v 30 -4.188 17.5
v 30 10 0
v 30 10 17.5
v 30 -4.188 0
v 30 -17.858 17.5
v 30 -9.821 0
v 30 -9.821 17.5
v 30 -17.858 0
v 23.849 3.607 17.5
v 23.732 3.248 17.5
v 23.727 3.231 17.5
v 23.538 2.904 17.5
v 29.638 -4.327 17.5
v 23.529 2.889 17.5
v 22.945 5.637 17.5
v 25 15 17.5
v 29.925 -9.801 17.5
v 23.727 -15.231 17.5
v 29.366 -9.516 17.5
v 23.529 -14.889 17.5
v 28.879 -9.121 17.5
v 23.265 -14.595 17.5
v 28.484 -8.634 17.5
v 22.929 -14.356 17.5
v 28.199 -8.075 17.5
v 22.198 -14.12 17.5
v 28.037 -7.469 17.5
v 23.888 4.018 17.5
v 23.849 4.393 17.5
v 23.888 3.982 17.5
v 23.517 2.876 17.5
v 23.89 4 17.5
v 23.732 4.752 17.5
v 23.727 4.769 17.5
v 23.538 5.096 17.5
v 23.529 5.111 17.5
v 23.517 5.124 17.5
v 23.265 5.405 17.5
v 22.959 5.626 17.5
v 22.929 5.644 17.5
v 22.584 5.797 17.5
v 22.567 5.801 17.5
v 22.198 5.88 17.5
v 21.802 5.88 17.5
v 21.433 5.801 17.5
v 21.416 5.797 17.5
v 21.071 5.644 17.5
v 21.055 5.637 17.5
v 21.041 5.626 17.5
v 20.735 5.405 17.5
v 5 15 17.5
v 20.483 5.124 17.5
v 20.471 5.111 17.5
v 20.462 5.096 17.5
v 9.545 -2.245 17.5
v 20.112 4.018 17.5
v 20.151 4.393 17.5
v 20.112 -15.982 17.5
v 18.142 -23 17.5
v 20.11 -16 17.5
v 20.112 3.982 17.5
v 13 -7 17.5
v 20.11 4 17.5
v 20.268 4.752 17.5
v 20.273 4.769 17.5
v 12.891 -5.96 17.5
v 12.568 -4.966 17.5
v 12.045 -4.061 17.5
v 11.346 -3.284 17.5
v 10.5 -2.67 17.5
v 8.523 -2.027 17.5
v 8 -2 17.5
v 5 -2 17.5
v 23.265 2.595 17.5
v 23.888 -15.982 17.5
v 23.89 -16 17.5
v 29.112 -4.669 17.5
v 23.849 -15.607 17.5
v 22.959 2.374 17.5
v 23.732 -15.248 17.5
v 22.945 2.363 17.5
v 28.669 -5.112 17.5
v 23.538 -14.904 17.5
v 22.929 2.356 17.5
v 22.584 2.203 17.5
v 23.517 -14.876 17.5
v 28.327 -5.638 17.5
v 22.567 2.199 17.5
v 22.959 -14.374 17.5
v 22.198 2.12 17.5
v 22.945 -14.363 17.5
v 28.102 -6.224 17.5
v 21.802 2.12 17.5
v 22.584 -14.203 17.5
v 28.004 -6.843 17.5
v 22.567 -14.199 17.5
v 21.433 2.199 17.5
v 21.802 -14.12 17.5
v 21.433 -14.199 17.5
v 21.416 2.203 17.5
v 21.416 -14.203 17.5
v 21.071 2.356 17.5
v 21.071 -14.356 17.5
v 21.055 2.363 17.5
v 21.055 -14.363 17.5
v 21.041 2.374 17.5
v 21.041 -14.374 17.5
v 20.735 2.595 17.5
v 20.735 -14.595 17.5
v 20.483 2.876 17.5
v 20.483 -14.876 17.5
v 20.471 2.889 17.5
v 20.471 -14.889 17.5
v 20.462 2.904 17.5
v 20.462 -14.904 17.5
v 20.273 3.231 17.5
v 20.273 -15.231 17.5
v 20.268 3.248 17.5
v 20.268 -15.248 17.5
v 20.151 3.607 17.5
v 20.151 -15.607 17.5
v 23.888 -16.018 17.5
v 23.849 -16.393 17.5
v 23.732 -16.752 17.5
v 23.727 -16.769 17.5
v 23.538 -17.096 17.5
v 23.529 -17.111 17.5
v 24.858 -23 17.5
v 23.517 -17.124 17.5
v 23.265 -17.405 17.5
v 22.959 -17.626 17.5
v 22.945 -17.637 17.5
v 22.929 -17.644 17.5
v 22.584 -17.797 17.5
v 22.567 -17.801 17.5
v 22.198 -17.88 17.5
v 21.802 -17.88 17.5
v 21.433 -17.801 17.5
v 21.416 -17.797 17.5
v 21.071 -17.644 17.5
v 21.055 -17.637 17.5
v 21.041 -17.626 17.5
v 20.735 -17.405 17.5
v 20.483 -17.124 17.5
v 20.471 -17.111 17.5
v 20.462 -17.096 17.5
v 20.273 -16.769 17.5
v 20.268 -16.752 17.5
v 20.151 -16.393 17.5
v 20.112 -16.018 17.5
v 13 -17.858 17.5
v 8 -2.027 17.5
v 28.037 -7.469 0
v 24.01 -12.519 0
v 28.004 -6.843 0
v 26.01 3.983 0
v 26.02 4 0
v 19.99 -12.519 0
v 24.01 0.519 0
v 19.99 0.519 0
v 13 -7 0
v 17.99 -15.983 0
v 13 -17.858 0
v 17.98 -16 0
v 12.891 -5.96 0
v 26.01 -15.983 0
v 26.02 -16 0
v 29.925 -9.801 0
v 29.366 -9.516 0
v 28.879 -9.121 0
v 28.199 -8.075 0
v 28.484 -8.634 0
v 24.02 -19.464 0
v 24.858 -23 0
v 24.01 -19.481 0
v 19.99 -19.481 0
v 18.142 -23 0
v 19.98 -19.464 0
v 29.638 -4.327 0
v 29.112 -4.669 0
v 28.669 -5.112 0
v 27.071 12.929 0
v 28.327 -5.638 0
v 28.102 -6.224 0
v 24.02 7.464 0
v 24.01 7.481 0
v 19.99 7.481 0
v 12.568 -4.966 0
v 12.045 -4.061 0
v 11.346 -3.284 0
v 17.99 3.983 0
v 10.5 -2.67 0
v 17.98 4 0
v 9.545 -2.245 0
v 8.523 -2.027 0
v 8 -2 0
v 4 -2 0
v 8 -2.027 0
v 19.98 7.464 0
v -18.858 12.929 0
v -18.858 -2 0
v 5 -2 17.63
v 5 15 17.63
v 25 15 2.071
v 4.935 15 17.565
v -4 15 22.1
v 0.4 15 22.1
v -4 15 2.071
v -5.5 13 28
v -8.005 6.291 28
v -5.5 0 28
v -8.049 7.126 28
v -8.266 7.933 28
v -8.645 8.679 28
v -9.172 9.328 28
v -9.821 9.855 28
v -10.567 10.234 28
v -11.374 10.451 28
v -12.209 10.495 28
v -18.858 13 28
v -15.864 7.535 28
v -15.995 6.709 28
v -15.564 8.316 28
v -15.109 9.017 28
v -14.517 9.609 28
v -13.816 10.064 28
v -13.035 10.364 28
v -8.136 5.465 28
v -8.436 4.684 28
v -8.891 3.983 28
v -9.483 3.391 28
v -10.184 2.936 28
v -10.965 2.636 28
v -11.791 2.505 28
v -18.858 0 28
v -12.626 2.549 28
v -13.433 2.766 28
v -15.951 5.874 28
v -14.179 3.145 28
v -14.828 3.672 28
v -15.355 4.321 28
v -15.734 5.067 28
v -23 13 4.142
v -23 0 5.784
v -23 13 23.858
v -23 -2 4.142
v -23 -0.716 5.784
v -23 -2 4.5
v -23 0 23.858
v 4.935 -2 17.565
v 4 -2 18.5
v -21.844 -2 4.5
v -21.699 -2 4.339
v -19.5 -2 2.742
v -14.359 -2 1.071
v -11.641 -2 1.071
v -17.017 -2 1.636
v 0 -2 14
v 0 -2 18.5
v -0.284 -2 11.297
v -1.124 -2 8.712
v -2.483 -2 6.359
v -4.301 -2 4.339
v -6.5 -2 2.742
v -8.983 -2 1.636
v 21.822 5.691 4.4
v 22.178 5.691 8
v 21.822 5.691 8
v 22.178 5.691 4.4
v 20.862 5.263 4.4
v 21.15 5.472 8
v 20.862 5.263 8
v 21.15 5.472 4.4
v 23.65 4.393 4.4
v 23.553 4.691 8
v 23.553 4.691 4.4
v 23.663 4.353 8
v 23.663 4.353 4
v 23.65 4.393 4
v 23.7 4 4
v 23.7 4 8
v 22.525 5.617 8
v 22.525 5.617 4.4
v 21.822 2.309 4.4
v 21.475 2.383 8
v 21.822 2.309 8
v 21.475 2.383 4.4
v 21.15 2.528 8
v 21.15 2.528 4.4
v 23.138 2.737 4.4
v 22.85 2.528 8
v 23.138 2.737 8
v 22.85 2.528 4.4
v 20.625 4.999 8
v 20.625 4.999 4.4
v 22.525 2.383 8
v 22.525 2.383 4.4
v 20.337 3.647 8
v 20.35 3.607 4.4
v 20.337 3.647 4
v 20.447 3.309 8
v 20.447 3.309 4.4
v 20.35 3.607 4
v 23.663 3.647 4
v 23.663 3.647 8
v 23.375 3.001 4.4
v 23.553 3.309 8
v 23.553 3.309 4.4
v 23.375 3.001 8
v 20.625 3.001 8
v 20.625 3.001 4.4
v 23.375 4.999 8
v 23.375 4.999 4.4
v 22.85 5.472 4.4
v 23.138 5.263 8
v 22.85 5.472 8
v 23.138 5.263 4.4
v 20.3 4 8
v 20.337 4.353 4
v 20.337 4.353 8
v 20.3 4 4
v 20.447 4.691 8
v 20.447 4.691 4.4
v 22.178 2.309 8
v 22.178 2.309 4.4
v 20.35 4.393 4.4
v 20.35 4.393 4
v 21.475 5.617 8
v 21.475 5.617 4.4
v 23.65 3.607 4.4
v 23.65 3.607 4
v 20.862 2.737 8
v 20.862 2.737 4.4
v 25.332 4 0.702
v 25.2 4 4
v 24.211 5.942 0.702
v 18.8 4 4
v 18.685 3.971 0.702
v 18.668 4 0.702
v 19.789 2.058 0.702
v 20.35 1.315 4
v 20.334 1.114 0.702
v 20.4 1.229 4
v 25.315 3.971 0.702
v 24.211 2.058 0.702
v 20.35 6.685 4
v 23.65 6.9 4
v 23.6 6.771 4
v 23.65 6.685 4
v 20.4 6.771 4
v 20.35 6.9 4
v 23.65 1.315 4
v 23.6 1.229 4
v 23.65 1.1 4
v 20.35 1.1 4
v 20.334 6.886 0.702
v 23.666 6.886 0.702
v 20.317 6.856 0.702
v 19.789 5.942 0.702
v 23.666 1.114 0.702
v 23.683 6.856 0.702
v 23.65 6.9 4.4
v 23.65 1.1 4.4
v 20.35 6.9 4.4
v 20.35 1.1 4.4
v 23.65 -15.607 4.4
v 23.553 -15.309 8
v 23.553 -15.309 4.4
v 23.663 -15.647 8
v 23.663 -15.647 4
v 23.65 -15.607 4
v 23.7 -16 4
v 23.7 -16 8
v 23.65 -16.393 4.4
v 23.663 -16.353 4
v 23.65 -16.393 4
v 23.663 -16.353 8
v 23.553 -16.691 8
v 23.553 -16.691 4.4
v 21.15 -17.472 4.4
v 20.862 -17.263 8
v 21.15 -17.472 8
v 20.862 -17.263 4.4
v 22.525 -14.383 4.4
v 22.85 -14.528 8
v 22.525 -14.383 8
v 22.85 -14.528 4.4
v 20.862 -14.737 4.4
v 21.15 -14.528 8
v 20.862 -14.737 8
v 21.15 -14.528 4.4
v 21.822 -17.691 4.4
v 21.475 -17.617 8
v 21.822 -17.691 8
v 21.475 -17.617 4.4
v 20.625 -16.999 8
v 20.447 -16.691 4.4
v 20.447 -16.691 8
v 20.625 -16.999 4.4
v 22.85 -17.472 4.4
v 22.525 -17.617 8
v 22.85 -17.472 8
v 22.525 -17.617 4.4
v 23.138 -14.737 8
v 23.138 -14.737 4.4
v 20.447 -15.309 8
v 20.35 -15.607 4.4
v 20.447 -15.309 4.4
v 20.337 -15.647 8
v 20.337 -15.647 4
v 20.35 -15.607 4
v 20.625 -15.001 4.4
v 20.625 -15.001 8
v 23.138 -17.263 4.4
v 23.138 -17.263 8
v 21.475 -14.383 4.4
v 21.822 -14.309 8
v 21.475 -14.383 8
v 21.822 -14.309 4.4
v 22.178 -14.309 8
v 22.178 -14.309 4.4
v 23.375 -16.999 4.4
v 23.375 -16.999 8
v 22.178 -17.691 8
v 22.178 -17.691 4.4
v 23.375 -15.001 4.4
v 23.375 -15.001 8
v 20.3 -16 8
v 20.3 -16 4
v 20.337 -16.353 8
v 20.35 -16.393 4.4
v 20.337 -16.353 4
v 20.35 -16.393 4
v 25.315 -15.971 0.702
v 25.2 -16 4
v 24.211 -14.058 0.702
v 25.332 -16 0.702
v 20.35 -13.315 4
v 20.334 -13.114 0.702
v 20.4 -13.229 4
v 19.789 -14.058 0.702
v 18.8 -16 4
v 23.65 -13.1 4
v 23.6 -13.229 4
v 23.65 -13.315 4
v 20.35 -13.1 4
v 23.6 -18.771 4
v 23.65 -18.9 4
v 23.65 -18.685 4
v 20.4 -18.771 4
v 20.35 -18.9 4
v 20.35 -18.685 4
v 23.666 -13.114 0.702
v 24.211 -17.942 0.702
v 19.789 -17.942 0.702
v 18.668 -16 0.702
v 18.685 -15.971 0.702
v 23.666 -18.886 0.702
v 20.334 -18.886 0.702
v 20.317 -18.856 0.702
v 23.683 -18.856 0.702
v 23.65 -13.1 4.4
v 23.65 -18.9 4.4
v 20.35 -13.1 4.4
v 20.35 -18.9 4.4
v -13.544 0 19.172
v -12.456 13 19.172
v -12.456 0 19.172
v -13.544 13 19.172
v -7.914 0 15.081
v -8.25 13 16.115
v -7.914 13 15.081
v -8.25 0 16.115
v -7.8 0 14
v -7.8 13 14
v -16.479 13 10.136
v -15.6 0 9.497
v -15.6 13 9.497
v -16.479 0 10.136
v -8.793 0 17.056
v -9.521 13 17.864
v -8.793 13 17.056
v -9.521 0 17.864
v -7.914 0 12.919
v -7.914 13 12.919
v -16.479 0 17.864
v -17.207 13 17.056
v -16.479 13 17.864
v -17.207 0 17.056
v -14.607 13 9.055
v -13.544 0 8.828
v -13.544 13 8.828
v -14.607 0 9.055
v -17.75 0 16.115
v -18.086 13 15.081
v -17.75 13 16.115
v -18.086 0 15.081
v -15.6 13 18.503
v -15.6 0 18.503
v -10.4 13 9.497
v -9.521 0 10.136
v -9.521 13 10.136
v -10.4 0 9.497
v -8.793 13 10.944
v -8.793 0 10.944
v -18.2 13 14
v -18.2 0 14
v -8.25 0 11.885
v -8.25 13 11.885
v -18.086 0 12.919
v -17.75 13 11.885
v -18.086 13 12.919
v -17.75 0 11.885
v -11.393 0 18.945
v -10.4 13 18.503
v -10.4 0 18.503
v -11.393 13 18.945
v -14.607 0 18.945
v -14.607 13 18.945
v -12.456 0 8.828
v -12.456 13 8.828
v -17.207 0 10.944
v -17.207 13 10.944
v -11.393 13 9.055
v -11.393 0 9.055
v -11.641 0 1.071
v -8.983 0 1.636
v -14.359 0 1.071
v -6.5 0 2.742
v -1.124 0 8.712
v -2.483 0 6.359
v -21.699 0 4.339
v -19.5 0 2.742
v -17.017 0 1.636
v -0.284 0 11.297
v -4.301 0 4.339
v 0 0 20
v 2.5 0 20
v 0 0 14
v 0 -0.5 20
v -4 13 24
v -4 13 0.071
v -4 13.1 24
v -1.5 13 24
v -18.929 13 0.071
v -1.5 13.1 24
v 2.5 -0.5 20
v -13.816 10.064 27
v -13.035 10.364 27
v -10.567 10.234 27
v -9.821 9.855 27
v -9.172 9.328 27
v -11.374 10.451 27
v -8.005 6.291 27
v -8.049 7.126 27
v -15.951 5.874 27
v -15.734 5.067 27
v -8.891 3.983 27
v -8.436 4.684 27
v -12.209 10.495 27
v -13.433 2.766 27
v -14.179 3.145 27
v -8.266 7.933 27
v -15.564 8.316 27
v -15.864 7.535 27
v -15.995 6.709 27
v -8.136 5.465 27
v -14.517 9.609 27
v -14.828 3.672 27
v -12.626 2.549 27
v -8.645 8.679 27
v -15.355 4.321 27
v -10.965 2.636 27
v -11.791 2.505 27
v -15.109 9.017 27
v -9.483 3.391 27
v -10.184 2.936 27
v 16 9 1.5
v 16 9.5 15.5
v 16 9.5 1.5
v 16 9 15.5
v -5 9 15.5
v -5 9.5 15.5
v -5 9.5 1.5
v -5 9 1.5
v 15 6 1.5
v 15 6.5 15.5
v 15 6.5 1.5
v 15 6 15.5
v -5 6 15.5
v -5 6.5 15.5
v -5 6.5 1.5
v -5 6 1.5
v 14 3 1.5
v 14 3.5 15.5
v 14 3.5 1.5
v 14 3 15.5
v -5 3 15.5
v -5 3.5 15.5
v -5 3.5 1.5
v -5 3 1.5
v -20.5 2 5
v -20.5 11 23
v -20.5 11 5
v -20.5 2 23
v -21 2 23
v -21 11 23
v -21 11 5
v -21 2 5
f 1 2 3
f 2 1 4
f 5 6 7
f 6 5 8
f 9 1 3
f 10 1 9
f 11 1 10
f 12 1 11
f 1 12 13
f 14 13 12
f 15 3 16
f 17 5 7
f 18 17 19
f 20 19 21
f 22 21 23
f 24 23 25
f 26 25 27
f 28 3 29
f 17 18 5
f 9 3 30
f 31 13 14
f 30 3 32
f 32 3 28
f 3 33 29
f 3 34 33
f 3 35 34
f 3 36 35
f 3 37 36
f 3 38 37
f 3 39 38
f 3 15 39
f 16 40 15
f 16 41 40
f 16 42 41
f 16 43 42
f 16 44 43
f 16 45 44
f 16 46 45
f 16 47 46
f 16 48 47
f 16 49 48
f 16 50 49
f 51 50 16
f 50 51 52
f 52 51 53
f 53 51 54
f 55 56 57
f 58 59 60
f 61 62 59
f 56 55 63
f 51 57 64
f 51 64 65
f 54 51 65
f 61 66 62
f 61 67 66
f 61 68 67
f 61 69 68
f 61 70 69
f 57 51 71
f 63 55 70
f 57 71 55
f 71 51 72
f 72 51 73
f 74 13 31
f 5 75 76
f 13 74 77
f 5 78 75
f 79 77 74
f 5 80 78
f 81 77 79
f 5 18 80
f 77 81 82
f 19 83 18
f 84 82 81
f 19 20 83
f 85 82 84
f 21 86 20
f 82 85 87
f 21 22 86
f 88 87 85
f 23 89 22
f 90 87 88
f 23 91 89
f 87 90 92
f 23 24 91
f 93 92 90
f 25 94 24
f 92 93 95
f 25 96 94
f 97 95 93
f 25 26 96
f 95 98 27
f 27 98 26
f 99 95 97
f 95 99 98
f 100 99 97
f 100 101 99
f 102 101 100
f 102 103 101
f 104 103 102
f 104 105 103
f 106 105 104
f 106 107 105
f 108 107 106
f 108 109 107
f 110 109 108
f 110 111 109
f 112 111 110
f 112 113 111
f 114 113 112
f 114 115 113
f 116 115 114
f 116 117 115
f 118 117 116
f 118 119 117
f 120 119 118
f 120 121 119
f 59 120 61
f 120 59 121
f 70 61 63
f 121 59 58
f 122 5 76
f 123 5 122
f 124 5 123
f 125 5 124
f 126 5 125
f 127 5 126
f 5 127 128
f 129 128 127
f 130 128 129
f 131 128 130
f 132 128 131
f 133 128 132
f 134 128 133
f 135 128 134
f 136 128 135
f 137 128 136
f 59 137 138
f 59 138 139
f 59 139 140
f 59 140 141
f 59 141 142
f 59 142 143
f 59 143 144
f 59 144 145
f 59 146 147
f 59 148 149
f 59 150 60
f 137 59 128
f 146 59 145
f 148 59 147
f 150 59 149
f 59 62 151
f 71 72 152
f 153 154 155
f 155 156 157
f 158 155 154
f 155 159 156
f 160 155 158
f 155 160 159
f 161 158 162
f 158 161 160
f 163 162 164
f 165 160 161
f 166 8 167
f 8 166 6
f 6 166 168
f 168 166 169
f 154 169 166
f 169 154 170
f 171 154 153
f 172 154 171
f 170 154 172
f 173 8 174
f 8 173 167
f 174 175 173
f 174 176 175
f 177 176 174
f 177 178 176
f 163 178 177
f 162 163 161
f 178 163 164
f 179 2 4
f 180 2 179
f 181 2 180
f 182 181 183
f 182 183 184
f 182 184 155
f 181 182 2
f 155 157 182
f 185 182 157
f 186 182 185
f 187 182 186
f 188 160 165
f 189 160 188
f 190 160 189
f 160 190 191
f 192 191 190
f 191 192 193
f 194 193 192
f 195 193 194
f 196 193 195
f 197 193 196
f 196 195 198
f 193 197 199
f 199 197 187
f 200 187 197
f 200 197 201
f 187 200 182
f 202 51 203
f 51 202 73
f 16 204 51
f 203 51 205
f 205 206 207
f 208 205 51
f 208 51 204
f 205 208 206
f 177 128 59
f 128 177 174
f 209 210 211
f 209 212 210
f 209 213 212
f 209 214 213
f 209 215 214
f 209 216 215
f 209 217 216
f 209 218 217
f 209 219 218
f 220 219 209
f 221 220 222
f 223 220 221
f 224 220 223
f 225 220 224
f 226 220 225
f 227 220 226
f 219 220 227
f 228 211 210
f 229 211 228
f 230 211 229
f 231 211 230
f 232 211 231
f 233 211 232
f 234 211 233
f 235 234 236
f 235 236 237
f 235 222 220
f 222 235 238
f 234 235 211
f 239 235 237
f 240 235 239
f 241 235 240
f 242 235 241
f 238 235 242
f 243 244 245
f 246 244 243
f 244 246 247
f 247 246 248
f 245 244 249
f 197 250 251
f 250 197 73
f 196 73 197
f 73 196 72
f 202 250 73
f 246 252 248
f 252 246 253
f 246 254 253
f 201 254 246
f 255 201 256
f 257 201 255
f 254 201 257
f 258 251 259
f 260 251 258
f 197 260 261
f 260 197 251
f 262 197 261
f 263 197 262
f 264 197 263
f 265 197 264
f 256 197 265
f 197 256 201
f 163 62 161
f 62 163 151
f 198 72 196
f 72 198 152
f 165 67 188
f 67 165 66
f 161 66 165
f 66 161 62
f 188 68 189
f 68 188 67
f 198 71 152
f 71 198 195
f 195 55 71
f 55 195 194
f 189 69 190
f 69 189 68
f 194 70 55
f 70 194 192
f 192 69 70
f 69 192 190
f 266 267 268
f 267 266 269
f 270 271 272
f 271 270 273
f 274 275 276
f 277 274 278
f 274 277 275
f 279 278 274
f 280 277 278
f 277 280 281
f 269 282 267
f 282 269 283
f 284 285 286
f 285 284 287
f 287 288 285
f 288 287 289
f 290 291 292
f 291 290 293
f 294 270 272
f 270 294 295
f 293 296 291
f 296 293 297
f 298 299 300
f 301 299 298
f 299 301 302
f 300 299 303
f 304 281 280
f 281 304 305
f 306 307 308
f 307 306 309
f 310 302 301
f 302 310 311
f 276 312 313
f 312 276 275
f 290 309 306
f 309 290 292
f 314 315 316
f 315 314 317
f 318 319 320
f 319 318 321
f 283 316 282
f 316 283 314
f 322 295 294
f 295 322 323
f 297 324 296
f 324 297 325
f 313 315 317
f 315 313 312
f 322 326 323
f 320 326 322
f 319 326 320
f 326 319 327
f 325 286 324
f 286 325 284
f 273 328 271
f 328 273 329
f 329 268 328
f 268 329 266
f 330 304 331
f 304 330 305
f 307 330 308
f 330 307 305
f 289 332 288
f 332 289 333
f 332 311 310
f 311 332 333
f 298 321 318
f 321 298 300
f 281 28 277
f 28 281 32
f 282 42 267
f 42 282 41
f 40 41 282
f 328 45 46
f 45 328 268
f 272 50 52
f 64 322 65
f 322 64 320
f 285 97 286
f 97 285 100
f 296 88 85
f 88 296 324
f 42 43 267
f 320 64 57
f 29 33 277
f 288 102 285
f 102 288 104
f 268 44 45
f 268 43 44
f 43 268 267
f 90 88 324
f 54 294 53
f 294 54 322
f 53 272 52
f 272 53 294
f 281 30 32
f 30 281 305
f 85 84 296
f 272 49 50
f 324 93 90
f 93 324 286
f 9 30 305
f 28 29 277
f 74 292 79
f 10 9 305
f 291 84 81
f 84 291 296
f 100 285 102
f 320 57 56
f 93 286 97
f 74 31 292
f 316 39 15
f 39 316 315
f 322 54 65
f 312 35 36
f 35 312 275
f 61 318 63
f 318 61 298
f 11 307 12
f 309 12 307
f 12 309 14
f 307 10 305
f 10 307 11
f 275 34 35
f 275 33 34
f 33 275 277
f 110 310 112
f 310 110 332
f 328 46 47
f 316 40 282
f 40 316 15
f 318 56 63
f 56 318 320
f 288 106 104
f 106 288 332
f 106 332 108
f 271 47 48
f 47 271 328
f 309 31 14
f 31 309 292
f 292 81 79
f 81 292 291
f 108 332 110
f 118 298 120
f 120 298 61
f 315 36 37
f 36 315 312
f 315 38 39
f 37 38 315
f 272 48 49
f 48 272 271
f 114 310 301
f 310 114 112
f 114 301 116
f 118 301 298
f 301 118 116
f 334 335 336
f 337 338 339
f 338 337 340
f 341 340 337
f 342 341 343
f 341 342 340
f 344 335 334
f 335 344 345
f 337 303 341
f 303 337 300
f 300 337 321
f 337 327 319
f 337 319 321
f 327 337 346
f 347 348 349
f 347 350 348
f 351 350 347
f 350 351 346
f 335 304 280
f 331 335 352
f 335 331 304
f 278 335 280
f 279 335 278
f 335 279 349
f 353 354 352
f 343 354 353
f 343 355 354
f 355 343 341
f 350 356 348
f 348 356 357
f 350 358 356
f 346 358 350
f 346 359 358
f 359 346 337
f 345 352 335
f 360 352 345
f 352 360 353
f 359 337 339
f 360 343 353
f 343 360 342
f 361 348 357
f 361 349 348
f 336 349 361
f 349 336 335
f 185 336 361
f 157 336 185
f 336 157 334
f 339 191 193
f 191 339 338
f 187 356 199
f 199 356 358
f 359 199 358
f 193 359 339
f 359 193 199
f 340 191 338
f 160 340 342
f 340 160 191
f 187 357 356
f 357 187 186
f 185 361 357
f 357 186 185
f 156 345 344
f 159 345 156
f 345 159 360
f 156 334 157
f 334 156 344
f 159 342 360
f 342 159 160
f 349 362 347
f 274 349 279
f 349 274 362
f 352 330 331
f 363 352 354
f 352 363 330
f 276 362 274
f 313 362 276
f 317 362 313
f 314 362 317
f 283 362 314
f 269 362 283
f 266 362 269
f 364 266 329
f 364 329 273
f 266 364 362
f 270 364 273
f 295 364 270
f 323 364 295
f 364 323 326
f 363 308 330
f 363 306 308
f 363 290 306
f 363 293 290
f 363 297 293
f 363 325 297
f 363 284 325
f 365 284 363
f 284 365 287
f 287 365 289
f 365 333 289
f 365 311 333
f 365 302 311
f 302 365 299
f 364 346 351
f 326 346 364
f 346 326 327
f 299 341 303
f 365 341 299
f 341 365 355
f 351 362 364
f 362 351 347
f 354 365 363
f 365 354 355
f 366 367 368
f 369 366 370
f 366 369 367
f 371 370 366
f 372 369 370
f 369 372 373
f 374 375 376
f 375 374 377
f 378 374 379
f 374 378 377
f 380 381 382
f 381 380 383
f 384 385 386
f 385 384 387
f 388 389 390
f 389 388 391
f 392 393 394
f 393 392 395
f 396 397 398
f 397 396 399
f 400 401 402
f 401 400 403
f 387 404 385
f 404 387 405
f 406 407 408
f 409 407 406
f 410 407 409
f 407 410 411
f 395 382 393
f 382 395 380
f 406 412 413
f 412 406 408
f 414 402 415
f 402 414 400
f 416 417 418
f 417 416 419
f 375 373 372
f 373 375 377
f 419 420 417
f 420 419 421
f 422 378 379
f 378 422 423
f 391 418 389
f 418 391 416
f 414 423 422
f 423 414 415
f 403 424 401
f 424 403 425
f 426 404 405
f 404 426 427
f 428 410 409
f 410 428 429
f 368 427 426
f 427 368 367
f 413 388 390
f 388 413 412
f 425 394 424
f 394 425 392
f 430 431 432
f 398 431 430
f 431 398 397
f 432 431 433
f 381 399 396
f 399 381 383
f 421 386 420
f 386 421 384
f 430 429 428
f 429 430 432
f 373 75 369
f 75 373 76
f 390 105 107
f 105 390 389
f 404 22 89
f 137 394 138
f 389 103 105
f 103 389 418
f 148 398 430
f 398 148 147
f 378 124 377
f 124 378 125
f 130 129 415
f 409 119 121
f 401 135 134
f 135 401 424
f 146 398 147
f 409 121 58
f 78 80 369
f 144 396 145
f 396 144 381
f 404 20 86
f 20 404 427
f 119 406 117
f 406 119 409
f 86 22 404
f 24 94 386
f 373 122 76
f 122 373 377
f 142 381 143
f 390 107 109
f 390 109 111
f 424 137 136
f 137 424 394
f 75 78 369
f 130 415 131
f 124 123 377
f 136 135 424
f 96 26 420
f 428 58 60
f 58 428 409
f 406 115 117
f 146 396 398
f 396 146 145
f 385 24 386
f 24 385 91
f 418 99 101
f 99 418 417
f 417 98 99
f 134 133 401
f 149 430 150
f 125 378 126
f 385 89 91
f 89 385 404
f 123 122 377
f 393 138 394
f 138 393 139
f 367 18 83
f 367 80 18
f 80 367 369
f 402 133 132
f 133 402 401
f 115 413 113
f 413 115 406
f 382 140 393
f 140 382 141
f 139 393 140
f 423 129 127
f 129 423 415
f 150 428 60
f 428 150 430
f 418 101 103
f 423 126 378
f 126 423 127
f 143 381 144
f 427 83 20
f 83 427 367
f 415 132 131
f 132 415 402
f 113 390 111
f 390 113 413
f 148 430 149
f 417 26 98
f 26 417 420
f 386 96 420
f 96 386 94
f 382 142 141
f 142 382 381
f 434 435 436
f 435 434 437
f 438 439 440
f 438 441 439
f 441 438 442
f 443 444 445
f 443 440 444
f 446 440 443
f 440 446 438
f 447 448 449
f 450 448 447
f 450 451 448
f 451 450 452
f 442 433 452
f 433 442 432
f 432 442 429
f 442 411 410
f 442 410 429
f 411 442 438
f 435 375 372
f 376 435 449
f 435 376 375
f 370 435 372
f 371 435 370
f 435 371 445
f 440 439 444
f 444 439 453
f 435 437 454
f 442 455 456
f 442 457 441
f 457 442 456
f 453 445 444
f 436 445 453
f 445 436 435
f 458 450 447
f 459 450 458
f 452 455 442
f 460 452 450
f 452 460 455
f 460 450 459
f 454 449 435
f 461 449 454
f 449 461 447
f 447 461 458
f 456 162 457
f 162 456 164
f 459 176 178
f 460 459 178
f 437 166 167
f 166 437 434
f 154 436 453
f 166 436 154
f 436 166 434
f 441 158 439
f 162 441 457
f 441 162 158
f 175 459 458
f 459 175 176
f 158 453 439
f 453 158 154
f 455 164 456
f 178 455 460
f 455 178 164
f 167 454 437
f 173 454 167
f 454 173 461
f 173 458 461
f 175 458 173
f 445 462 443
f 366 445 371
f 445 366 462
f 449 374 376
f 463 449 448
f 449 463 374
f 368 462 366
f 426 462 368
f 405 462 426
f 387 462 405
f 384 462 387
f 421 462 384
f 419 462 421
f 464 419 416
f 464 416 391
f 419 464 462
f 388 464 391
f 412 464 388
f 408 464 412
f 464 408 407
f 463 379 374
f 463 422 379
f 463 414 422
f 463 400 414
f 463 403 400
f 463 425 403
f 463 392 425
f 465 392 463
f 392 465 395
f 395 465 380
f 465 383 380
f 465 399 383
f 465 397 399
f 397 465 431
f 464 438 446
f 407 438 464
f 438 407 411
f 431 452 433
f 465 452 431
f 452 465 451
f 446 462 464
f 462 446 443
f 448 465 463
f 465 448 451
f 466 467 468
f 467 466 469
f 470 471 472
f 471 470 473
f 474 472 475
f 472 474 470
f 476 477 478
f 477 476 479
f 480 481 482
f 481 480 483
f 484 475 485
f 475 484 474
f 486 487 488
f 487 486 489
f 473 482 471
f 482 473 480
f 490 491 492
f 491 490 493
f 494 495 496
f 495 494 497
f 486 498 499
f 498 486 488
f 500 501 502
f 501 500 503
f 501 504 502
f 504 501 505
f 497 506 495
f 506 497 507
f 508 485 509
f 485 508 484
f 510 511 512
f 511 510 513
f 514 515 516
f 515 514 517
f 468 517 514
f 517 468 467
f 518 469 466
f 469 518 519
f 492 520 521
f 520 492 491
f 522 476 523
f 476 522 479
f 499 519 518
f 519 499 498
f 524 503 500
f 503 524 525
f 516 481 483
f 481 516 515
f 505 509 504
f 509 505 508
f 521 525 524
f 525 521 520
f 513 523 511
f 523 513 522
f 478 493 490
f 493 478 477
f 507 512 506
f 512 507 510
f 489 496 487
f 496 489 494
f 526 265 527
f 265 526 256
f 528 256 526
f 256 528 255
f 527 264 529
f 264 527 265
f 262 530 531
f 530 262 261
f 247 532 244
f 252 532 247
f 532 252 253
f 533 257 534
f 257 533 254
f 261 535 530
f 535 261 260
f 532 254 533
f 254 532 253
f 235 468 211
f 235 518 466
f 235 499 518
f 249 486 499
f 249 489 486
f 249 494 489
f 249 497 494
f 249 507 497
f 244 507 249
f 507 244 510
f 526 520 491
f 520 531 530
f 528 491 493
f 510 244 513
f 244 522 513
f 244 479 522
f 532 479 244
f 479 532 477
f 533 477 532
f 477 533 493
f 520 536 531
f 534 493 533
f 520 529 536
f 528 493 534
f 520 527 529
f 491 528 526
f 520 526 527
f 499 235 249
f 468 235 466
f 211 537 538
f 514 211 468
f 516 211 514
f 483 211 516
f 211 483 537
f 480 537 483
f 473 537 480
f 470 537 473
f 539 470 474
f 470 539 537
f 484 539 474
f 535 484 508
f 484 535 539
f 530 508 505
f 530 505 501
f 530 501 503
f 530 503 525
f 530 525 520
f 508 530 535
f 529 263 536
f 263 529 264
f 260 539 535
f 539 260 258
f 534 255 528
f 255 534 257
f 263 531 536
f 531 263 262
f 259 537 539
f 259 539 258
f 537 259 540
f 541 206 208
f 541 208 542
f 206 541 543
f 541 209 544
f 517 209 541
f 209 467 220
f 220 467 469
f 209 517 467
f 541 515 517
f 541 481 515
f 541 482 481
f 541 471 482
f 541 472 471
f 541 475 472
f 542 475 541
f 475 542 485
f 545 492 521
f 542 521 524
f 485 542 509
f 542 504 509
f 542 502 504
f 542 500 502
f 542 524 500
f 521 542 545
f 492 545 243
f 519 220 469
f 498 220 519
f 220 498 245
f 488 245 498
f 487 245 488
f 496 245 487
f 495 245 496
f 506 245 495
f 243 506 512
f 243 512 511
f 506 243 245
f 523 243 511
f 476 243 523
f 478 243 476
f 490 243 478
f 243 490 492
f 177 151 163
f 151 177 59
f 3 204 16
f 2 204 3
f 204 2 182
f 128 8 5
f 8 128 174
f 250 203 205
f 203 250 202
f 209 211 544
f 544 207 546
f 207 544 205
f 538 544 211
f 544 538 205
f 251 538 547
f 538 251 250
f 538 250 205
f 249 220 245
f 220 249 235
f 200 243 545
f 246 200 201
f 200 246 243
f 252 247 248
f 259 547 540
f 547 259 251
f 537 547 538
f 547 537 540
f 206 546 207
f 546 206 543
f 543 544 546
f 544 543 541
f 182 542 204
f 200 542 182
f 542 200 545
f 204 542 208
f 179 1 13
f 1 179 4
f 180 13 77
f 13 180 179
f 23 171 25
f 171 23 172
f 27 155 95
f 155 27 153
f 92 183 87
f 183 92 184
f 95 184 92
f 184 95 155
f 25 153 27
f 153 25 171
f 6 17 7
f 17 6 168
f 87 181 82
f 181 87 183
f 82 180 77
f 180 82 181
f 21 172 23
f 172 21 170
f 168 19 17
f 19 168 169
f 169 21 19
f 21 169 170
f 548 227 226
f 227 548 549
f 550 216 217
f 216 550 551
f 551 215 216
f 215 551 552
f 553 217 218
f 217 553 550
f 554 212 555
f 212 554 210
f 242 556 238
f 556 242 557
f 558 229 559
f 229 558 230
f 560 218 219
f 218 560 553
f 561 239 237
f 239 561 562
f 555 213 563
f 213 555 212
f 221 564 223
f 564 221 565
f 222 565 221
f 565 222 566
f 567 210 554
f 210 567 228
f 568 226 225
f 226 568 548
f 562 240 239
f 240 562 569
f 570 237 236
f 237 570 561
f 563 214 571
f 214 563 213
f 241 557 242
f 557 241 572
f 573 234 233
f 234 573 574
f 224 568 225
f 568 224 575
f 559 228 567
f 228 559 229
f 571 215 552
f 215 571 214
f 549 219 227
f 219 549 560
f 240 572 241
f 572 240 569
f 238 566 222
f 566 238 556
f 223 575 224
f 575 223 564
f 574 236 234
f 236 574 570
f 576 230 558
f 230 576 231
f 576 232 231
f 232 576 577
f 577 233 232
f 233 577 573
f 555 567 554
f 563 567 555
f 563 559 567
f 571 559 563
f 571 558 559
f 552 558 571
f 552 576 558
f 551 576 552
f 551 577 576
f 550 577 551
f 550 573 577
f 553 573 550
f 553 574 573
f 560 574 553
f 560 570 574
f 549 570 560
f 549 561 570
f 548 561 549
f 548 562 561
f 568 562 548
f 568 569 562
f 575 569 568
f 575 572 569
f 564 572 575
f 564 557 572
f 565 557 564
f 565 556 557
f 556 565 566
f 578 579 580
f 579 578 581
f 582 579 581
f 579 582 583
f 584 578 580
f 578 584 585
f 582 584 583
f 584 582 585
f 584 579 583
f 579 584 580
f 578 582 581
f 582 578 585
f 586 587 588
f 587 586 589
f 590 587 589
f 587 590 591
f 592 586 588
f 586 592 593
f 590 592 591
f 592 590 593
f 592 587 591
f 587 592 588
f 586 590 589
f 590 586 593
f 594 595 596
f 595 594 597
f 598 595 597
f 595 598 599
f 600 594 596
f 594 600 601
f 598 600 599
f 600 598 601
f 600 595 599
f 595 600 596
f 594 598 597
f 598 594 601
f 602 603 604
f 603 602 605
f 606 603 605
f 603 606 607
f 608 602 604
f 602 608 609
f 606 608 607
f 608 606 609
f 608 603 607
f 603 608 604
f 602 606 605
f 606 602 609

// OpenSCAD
// PRUSA iteration3
// PSU-Y reinforcement part 
// GNU GPL v3
// Josef Průša <iam@josefprusa.cz> and contributors
// http://www.reprap.org/wiki/Prusa_Mendel
// http://prusamendel.org

module base()
{
union(){
    difference(){
        union(){
        translate([ 5, -23, 0 ]) cube([ 25, 38, 17.5 ]);  // horizontal plate
        translate([ -23, -2, 0 ]) cube([ 28, 17, 28 ]);  // Y_Corner block    
        }
        translate( [ 4 , -25 , -1 ] ) cube( [ 9 , 23 , 20 ] );  //  holder side cut
    }
    difference(){    
        translate([ 8, -7, 0 ]) cube([ 5, 5, 17.5 ]);  // fillet block
        translate([ 8, -7, -1 ]) cylinder( h = 28, r = 5, $fn=30);  // fillet cut
        }
    }
}


module cutout()
    {
// NV: keep these small adjustments
    translate([ 22, 4 , -2 ]) cylinder( h = 20, r = 1.7, $fn=30);  // M3 hole A
    translate([ 22, 4 , 8 ]) cylinder( h = 10, r1 = 1.7, r2=1.9,$fn=30);  // M3 hole A
    translate([ 22, 4 , -1 ]) cylinder( h = 5, r1 = 3.4, r2=3.2,$fn=6);  // M3 nut body A        
    translate([ 22, 4 , -1 ]) cylinder( h = 5, r2 = 0.1, r1 = 5, $fn=6);  // M3 nut hole fillet A
    #translate([ 22, 4 , 4.2 ]) cube([ 3.3 , 5.8 , 0.4 ], center = true ); // bridge force A
        
    translate([ 22, -16 , -2 ]) cylinder( h = 20, r = 1.7, $fn=30);  // M3 hole B
    translate([ 22, -16 , 8 ]) cylinder( h = 10, r1 = 1.7, r2=1.9, $fn=30);  // M3 hole B
    translate([ 22, -16 , -1 ]) cylinder( h = 5, r1 = 3.4, r2=3.2, $fn=6);  // M3 nut body B
    translate([ 22, -16 , -1 ]) cylinder( h = 5, r2 = 0.1, r1 = 5, $fn=6);  // M3 nut hole B fillet
    #translate([ 22, -16 , 4.2 ]) cube([ 3.3 , 5.8 , 0.4 ], center = true ); // bridge force B

    translate([ -13, 14 , 14 ]) rotate([90,0,0]) cylinder( h = 25, r = 5.2, $fn=30);  // threaded rod
    
    translate([ -13, 0 , 14 ]) rotate([90,0,0]) cylinder( h = 4, r = 13, $fn=30);  // washer
    translate([ -29, -7 , 14 ])  cube([ 29, 7, 18 ]);  // washer upper cut
    
    translate([ -24, 13 , -1 ]) cube([ 20, 15, 30 ]);  // Y_Corner cutaway

    //vertical corners 45 degree cut
    translate( [ 12, -31 , -2 ] ) rotate( [0,0,45] ) cube([ 10 , 10 , 21 ]);  
    translate([ 31,  9, -2 ])  rotate( [0,0,45] ) cube([ 10, 10, 21 ]);  
    translate([ 31, -31, -2 ]) rotate( [0,0,45] ) cube([ 10, 10, 21 ]);  

    // horizontal corners 45 degree cut
    // NV: keep these small adjustments
    translate([ -8.5, -8, 31 ]) rotate( [0,45,0] ) cube([ 19, 40, 20 ]);  
    translate([ -31, -6, 30 ]) rotate( [0,45,0])  cube([ 10, 35, 10 ]);  
    translate([ -31, -6, -2 ]) rotate( [0,45,0] ) cube([ 10, 35, 10 ]);  
    translate([ -26, -4,  2.5 ]) rotate( [45,0,0] ) cube([ 5, 5, 5 ]);  
    translate([ -1, -4, 16.5 ]) rotate( [45,0,0] ) cube([ 5, 5, 5 ]);  
    translate([ -1, -5, 20 ]) cube([ 5, 5, 5 ]);  
    translate([ -5, 16.6, 20.5 ]) rotate( [45,0,0] ) cube([ 6, 5, 5 ]);  
    translate([ -5, 13, 24 ]) cube([ 6, 5, 5 ]);  
    translate([ -30, 15, -5 ]) rotate( [45,0,0] ) cube([ 70, 5, 5 ]);  
    
    // NV: keep these small adjustments
    translate([ 31, -7, -1 ]) rotate([0,0,45]) cylinder( h = 25, r = 3, $fn=30);  
    translate([ -12, 6.5, 27 ]) rotate([0,0,45]) cylinder( h = 25, r = 4, $fn=30);  
    
    // NV: keep these small adjustments
    translate([ -5, 9, 1.5 ]) cube([ 21, 0.5, 14 ]);  
    translate([ -5, 6, 1.5 ]) cube([ 20, 0.5, 14 ]);  
    translate([ -5, 3, 1.5 ]) cube([ 19, 0.5, 14 ]);  
    translate([ -21, 2, 5 ]) cube([ 0.5, 9, 18 ]);  
    }

module final_part(){
difference()
{
    base();
    cutout();
    }
}

final_part();
    
